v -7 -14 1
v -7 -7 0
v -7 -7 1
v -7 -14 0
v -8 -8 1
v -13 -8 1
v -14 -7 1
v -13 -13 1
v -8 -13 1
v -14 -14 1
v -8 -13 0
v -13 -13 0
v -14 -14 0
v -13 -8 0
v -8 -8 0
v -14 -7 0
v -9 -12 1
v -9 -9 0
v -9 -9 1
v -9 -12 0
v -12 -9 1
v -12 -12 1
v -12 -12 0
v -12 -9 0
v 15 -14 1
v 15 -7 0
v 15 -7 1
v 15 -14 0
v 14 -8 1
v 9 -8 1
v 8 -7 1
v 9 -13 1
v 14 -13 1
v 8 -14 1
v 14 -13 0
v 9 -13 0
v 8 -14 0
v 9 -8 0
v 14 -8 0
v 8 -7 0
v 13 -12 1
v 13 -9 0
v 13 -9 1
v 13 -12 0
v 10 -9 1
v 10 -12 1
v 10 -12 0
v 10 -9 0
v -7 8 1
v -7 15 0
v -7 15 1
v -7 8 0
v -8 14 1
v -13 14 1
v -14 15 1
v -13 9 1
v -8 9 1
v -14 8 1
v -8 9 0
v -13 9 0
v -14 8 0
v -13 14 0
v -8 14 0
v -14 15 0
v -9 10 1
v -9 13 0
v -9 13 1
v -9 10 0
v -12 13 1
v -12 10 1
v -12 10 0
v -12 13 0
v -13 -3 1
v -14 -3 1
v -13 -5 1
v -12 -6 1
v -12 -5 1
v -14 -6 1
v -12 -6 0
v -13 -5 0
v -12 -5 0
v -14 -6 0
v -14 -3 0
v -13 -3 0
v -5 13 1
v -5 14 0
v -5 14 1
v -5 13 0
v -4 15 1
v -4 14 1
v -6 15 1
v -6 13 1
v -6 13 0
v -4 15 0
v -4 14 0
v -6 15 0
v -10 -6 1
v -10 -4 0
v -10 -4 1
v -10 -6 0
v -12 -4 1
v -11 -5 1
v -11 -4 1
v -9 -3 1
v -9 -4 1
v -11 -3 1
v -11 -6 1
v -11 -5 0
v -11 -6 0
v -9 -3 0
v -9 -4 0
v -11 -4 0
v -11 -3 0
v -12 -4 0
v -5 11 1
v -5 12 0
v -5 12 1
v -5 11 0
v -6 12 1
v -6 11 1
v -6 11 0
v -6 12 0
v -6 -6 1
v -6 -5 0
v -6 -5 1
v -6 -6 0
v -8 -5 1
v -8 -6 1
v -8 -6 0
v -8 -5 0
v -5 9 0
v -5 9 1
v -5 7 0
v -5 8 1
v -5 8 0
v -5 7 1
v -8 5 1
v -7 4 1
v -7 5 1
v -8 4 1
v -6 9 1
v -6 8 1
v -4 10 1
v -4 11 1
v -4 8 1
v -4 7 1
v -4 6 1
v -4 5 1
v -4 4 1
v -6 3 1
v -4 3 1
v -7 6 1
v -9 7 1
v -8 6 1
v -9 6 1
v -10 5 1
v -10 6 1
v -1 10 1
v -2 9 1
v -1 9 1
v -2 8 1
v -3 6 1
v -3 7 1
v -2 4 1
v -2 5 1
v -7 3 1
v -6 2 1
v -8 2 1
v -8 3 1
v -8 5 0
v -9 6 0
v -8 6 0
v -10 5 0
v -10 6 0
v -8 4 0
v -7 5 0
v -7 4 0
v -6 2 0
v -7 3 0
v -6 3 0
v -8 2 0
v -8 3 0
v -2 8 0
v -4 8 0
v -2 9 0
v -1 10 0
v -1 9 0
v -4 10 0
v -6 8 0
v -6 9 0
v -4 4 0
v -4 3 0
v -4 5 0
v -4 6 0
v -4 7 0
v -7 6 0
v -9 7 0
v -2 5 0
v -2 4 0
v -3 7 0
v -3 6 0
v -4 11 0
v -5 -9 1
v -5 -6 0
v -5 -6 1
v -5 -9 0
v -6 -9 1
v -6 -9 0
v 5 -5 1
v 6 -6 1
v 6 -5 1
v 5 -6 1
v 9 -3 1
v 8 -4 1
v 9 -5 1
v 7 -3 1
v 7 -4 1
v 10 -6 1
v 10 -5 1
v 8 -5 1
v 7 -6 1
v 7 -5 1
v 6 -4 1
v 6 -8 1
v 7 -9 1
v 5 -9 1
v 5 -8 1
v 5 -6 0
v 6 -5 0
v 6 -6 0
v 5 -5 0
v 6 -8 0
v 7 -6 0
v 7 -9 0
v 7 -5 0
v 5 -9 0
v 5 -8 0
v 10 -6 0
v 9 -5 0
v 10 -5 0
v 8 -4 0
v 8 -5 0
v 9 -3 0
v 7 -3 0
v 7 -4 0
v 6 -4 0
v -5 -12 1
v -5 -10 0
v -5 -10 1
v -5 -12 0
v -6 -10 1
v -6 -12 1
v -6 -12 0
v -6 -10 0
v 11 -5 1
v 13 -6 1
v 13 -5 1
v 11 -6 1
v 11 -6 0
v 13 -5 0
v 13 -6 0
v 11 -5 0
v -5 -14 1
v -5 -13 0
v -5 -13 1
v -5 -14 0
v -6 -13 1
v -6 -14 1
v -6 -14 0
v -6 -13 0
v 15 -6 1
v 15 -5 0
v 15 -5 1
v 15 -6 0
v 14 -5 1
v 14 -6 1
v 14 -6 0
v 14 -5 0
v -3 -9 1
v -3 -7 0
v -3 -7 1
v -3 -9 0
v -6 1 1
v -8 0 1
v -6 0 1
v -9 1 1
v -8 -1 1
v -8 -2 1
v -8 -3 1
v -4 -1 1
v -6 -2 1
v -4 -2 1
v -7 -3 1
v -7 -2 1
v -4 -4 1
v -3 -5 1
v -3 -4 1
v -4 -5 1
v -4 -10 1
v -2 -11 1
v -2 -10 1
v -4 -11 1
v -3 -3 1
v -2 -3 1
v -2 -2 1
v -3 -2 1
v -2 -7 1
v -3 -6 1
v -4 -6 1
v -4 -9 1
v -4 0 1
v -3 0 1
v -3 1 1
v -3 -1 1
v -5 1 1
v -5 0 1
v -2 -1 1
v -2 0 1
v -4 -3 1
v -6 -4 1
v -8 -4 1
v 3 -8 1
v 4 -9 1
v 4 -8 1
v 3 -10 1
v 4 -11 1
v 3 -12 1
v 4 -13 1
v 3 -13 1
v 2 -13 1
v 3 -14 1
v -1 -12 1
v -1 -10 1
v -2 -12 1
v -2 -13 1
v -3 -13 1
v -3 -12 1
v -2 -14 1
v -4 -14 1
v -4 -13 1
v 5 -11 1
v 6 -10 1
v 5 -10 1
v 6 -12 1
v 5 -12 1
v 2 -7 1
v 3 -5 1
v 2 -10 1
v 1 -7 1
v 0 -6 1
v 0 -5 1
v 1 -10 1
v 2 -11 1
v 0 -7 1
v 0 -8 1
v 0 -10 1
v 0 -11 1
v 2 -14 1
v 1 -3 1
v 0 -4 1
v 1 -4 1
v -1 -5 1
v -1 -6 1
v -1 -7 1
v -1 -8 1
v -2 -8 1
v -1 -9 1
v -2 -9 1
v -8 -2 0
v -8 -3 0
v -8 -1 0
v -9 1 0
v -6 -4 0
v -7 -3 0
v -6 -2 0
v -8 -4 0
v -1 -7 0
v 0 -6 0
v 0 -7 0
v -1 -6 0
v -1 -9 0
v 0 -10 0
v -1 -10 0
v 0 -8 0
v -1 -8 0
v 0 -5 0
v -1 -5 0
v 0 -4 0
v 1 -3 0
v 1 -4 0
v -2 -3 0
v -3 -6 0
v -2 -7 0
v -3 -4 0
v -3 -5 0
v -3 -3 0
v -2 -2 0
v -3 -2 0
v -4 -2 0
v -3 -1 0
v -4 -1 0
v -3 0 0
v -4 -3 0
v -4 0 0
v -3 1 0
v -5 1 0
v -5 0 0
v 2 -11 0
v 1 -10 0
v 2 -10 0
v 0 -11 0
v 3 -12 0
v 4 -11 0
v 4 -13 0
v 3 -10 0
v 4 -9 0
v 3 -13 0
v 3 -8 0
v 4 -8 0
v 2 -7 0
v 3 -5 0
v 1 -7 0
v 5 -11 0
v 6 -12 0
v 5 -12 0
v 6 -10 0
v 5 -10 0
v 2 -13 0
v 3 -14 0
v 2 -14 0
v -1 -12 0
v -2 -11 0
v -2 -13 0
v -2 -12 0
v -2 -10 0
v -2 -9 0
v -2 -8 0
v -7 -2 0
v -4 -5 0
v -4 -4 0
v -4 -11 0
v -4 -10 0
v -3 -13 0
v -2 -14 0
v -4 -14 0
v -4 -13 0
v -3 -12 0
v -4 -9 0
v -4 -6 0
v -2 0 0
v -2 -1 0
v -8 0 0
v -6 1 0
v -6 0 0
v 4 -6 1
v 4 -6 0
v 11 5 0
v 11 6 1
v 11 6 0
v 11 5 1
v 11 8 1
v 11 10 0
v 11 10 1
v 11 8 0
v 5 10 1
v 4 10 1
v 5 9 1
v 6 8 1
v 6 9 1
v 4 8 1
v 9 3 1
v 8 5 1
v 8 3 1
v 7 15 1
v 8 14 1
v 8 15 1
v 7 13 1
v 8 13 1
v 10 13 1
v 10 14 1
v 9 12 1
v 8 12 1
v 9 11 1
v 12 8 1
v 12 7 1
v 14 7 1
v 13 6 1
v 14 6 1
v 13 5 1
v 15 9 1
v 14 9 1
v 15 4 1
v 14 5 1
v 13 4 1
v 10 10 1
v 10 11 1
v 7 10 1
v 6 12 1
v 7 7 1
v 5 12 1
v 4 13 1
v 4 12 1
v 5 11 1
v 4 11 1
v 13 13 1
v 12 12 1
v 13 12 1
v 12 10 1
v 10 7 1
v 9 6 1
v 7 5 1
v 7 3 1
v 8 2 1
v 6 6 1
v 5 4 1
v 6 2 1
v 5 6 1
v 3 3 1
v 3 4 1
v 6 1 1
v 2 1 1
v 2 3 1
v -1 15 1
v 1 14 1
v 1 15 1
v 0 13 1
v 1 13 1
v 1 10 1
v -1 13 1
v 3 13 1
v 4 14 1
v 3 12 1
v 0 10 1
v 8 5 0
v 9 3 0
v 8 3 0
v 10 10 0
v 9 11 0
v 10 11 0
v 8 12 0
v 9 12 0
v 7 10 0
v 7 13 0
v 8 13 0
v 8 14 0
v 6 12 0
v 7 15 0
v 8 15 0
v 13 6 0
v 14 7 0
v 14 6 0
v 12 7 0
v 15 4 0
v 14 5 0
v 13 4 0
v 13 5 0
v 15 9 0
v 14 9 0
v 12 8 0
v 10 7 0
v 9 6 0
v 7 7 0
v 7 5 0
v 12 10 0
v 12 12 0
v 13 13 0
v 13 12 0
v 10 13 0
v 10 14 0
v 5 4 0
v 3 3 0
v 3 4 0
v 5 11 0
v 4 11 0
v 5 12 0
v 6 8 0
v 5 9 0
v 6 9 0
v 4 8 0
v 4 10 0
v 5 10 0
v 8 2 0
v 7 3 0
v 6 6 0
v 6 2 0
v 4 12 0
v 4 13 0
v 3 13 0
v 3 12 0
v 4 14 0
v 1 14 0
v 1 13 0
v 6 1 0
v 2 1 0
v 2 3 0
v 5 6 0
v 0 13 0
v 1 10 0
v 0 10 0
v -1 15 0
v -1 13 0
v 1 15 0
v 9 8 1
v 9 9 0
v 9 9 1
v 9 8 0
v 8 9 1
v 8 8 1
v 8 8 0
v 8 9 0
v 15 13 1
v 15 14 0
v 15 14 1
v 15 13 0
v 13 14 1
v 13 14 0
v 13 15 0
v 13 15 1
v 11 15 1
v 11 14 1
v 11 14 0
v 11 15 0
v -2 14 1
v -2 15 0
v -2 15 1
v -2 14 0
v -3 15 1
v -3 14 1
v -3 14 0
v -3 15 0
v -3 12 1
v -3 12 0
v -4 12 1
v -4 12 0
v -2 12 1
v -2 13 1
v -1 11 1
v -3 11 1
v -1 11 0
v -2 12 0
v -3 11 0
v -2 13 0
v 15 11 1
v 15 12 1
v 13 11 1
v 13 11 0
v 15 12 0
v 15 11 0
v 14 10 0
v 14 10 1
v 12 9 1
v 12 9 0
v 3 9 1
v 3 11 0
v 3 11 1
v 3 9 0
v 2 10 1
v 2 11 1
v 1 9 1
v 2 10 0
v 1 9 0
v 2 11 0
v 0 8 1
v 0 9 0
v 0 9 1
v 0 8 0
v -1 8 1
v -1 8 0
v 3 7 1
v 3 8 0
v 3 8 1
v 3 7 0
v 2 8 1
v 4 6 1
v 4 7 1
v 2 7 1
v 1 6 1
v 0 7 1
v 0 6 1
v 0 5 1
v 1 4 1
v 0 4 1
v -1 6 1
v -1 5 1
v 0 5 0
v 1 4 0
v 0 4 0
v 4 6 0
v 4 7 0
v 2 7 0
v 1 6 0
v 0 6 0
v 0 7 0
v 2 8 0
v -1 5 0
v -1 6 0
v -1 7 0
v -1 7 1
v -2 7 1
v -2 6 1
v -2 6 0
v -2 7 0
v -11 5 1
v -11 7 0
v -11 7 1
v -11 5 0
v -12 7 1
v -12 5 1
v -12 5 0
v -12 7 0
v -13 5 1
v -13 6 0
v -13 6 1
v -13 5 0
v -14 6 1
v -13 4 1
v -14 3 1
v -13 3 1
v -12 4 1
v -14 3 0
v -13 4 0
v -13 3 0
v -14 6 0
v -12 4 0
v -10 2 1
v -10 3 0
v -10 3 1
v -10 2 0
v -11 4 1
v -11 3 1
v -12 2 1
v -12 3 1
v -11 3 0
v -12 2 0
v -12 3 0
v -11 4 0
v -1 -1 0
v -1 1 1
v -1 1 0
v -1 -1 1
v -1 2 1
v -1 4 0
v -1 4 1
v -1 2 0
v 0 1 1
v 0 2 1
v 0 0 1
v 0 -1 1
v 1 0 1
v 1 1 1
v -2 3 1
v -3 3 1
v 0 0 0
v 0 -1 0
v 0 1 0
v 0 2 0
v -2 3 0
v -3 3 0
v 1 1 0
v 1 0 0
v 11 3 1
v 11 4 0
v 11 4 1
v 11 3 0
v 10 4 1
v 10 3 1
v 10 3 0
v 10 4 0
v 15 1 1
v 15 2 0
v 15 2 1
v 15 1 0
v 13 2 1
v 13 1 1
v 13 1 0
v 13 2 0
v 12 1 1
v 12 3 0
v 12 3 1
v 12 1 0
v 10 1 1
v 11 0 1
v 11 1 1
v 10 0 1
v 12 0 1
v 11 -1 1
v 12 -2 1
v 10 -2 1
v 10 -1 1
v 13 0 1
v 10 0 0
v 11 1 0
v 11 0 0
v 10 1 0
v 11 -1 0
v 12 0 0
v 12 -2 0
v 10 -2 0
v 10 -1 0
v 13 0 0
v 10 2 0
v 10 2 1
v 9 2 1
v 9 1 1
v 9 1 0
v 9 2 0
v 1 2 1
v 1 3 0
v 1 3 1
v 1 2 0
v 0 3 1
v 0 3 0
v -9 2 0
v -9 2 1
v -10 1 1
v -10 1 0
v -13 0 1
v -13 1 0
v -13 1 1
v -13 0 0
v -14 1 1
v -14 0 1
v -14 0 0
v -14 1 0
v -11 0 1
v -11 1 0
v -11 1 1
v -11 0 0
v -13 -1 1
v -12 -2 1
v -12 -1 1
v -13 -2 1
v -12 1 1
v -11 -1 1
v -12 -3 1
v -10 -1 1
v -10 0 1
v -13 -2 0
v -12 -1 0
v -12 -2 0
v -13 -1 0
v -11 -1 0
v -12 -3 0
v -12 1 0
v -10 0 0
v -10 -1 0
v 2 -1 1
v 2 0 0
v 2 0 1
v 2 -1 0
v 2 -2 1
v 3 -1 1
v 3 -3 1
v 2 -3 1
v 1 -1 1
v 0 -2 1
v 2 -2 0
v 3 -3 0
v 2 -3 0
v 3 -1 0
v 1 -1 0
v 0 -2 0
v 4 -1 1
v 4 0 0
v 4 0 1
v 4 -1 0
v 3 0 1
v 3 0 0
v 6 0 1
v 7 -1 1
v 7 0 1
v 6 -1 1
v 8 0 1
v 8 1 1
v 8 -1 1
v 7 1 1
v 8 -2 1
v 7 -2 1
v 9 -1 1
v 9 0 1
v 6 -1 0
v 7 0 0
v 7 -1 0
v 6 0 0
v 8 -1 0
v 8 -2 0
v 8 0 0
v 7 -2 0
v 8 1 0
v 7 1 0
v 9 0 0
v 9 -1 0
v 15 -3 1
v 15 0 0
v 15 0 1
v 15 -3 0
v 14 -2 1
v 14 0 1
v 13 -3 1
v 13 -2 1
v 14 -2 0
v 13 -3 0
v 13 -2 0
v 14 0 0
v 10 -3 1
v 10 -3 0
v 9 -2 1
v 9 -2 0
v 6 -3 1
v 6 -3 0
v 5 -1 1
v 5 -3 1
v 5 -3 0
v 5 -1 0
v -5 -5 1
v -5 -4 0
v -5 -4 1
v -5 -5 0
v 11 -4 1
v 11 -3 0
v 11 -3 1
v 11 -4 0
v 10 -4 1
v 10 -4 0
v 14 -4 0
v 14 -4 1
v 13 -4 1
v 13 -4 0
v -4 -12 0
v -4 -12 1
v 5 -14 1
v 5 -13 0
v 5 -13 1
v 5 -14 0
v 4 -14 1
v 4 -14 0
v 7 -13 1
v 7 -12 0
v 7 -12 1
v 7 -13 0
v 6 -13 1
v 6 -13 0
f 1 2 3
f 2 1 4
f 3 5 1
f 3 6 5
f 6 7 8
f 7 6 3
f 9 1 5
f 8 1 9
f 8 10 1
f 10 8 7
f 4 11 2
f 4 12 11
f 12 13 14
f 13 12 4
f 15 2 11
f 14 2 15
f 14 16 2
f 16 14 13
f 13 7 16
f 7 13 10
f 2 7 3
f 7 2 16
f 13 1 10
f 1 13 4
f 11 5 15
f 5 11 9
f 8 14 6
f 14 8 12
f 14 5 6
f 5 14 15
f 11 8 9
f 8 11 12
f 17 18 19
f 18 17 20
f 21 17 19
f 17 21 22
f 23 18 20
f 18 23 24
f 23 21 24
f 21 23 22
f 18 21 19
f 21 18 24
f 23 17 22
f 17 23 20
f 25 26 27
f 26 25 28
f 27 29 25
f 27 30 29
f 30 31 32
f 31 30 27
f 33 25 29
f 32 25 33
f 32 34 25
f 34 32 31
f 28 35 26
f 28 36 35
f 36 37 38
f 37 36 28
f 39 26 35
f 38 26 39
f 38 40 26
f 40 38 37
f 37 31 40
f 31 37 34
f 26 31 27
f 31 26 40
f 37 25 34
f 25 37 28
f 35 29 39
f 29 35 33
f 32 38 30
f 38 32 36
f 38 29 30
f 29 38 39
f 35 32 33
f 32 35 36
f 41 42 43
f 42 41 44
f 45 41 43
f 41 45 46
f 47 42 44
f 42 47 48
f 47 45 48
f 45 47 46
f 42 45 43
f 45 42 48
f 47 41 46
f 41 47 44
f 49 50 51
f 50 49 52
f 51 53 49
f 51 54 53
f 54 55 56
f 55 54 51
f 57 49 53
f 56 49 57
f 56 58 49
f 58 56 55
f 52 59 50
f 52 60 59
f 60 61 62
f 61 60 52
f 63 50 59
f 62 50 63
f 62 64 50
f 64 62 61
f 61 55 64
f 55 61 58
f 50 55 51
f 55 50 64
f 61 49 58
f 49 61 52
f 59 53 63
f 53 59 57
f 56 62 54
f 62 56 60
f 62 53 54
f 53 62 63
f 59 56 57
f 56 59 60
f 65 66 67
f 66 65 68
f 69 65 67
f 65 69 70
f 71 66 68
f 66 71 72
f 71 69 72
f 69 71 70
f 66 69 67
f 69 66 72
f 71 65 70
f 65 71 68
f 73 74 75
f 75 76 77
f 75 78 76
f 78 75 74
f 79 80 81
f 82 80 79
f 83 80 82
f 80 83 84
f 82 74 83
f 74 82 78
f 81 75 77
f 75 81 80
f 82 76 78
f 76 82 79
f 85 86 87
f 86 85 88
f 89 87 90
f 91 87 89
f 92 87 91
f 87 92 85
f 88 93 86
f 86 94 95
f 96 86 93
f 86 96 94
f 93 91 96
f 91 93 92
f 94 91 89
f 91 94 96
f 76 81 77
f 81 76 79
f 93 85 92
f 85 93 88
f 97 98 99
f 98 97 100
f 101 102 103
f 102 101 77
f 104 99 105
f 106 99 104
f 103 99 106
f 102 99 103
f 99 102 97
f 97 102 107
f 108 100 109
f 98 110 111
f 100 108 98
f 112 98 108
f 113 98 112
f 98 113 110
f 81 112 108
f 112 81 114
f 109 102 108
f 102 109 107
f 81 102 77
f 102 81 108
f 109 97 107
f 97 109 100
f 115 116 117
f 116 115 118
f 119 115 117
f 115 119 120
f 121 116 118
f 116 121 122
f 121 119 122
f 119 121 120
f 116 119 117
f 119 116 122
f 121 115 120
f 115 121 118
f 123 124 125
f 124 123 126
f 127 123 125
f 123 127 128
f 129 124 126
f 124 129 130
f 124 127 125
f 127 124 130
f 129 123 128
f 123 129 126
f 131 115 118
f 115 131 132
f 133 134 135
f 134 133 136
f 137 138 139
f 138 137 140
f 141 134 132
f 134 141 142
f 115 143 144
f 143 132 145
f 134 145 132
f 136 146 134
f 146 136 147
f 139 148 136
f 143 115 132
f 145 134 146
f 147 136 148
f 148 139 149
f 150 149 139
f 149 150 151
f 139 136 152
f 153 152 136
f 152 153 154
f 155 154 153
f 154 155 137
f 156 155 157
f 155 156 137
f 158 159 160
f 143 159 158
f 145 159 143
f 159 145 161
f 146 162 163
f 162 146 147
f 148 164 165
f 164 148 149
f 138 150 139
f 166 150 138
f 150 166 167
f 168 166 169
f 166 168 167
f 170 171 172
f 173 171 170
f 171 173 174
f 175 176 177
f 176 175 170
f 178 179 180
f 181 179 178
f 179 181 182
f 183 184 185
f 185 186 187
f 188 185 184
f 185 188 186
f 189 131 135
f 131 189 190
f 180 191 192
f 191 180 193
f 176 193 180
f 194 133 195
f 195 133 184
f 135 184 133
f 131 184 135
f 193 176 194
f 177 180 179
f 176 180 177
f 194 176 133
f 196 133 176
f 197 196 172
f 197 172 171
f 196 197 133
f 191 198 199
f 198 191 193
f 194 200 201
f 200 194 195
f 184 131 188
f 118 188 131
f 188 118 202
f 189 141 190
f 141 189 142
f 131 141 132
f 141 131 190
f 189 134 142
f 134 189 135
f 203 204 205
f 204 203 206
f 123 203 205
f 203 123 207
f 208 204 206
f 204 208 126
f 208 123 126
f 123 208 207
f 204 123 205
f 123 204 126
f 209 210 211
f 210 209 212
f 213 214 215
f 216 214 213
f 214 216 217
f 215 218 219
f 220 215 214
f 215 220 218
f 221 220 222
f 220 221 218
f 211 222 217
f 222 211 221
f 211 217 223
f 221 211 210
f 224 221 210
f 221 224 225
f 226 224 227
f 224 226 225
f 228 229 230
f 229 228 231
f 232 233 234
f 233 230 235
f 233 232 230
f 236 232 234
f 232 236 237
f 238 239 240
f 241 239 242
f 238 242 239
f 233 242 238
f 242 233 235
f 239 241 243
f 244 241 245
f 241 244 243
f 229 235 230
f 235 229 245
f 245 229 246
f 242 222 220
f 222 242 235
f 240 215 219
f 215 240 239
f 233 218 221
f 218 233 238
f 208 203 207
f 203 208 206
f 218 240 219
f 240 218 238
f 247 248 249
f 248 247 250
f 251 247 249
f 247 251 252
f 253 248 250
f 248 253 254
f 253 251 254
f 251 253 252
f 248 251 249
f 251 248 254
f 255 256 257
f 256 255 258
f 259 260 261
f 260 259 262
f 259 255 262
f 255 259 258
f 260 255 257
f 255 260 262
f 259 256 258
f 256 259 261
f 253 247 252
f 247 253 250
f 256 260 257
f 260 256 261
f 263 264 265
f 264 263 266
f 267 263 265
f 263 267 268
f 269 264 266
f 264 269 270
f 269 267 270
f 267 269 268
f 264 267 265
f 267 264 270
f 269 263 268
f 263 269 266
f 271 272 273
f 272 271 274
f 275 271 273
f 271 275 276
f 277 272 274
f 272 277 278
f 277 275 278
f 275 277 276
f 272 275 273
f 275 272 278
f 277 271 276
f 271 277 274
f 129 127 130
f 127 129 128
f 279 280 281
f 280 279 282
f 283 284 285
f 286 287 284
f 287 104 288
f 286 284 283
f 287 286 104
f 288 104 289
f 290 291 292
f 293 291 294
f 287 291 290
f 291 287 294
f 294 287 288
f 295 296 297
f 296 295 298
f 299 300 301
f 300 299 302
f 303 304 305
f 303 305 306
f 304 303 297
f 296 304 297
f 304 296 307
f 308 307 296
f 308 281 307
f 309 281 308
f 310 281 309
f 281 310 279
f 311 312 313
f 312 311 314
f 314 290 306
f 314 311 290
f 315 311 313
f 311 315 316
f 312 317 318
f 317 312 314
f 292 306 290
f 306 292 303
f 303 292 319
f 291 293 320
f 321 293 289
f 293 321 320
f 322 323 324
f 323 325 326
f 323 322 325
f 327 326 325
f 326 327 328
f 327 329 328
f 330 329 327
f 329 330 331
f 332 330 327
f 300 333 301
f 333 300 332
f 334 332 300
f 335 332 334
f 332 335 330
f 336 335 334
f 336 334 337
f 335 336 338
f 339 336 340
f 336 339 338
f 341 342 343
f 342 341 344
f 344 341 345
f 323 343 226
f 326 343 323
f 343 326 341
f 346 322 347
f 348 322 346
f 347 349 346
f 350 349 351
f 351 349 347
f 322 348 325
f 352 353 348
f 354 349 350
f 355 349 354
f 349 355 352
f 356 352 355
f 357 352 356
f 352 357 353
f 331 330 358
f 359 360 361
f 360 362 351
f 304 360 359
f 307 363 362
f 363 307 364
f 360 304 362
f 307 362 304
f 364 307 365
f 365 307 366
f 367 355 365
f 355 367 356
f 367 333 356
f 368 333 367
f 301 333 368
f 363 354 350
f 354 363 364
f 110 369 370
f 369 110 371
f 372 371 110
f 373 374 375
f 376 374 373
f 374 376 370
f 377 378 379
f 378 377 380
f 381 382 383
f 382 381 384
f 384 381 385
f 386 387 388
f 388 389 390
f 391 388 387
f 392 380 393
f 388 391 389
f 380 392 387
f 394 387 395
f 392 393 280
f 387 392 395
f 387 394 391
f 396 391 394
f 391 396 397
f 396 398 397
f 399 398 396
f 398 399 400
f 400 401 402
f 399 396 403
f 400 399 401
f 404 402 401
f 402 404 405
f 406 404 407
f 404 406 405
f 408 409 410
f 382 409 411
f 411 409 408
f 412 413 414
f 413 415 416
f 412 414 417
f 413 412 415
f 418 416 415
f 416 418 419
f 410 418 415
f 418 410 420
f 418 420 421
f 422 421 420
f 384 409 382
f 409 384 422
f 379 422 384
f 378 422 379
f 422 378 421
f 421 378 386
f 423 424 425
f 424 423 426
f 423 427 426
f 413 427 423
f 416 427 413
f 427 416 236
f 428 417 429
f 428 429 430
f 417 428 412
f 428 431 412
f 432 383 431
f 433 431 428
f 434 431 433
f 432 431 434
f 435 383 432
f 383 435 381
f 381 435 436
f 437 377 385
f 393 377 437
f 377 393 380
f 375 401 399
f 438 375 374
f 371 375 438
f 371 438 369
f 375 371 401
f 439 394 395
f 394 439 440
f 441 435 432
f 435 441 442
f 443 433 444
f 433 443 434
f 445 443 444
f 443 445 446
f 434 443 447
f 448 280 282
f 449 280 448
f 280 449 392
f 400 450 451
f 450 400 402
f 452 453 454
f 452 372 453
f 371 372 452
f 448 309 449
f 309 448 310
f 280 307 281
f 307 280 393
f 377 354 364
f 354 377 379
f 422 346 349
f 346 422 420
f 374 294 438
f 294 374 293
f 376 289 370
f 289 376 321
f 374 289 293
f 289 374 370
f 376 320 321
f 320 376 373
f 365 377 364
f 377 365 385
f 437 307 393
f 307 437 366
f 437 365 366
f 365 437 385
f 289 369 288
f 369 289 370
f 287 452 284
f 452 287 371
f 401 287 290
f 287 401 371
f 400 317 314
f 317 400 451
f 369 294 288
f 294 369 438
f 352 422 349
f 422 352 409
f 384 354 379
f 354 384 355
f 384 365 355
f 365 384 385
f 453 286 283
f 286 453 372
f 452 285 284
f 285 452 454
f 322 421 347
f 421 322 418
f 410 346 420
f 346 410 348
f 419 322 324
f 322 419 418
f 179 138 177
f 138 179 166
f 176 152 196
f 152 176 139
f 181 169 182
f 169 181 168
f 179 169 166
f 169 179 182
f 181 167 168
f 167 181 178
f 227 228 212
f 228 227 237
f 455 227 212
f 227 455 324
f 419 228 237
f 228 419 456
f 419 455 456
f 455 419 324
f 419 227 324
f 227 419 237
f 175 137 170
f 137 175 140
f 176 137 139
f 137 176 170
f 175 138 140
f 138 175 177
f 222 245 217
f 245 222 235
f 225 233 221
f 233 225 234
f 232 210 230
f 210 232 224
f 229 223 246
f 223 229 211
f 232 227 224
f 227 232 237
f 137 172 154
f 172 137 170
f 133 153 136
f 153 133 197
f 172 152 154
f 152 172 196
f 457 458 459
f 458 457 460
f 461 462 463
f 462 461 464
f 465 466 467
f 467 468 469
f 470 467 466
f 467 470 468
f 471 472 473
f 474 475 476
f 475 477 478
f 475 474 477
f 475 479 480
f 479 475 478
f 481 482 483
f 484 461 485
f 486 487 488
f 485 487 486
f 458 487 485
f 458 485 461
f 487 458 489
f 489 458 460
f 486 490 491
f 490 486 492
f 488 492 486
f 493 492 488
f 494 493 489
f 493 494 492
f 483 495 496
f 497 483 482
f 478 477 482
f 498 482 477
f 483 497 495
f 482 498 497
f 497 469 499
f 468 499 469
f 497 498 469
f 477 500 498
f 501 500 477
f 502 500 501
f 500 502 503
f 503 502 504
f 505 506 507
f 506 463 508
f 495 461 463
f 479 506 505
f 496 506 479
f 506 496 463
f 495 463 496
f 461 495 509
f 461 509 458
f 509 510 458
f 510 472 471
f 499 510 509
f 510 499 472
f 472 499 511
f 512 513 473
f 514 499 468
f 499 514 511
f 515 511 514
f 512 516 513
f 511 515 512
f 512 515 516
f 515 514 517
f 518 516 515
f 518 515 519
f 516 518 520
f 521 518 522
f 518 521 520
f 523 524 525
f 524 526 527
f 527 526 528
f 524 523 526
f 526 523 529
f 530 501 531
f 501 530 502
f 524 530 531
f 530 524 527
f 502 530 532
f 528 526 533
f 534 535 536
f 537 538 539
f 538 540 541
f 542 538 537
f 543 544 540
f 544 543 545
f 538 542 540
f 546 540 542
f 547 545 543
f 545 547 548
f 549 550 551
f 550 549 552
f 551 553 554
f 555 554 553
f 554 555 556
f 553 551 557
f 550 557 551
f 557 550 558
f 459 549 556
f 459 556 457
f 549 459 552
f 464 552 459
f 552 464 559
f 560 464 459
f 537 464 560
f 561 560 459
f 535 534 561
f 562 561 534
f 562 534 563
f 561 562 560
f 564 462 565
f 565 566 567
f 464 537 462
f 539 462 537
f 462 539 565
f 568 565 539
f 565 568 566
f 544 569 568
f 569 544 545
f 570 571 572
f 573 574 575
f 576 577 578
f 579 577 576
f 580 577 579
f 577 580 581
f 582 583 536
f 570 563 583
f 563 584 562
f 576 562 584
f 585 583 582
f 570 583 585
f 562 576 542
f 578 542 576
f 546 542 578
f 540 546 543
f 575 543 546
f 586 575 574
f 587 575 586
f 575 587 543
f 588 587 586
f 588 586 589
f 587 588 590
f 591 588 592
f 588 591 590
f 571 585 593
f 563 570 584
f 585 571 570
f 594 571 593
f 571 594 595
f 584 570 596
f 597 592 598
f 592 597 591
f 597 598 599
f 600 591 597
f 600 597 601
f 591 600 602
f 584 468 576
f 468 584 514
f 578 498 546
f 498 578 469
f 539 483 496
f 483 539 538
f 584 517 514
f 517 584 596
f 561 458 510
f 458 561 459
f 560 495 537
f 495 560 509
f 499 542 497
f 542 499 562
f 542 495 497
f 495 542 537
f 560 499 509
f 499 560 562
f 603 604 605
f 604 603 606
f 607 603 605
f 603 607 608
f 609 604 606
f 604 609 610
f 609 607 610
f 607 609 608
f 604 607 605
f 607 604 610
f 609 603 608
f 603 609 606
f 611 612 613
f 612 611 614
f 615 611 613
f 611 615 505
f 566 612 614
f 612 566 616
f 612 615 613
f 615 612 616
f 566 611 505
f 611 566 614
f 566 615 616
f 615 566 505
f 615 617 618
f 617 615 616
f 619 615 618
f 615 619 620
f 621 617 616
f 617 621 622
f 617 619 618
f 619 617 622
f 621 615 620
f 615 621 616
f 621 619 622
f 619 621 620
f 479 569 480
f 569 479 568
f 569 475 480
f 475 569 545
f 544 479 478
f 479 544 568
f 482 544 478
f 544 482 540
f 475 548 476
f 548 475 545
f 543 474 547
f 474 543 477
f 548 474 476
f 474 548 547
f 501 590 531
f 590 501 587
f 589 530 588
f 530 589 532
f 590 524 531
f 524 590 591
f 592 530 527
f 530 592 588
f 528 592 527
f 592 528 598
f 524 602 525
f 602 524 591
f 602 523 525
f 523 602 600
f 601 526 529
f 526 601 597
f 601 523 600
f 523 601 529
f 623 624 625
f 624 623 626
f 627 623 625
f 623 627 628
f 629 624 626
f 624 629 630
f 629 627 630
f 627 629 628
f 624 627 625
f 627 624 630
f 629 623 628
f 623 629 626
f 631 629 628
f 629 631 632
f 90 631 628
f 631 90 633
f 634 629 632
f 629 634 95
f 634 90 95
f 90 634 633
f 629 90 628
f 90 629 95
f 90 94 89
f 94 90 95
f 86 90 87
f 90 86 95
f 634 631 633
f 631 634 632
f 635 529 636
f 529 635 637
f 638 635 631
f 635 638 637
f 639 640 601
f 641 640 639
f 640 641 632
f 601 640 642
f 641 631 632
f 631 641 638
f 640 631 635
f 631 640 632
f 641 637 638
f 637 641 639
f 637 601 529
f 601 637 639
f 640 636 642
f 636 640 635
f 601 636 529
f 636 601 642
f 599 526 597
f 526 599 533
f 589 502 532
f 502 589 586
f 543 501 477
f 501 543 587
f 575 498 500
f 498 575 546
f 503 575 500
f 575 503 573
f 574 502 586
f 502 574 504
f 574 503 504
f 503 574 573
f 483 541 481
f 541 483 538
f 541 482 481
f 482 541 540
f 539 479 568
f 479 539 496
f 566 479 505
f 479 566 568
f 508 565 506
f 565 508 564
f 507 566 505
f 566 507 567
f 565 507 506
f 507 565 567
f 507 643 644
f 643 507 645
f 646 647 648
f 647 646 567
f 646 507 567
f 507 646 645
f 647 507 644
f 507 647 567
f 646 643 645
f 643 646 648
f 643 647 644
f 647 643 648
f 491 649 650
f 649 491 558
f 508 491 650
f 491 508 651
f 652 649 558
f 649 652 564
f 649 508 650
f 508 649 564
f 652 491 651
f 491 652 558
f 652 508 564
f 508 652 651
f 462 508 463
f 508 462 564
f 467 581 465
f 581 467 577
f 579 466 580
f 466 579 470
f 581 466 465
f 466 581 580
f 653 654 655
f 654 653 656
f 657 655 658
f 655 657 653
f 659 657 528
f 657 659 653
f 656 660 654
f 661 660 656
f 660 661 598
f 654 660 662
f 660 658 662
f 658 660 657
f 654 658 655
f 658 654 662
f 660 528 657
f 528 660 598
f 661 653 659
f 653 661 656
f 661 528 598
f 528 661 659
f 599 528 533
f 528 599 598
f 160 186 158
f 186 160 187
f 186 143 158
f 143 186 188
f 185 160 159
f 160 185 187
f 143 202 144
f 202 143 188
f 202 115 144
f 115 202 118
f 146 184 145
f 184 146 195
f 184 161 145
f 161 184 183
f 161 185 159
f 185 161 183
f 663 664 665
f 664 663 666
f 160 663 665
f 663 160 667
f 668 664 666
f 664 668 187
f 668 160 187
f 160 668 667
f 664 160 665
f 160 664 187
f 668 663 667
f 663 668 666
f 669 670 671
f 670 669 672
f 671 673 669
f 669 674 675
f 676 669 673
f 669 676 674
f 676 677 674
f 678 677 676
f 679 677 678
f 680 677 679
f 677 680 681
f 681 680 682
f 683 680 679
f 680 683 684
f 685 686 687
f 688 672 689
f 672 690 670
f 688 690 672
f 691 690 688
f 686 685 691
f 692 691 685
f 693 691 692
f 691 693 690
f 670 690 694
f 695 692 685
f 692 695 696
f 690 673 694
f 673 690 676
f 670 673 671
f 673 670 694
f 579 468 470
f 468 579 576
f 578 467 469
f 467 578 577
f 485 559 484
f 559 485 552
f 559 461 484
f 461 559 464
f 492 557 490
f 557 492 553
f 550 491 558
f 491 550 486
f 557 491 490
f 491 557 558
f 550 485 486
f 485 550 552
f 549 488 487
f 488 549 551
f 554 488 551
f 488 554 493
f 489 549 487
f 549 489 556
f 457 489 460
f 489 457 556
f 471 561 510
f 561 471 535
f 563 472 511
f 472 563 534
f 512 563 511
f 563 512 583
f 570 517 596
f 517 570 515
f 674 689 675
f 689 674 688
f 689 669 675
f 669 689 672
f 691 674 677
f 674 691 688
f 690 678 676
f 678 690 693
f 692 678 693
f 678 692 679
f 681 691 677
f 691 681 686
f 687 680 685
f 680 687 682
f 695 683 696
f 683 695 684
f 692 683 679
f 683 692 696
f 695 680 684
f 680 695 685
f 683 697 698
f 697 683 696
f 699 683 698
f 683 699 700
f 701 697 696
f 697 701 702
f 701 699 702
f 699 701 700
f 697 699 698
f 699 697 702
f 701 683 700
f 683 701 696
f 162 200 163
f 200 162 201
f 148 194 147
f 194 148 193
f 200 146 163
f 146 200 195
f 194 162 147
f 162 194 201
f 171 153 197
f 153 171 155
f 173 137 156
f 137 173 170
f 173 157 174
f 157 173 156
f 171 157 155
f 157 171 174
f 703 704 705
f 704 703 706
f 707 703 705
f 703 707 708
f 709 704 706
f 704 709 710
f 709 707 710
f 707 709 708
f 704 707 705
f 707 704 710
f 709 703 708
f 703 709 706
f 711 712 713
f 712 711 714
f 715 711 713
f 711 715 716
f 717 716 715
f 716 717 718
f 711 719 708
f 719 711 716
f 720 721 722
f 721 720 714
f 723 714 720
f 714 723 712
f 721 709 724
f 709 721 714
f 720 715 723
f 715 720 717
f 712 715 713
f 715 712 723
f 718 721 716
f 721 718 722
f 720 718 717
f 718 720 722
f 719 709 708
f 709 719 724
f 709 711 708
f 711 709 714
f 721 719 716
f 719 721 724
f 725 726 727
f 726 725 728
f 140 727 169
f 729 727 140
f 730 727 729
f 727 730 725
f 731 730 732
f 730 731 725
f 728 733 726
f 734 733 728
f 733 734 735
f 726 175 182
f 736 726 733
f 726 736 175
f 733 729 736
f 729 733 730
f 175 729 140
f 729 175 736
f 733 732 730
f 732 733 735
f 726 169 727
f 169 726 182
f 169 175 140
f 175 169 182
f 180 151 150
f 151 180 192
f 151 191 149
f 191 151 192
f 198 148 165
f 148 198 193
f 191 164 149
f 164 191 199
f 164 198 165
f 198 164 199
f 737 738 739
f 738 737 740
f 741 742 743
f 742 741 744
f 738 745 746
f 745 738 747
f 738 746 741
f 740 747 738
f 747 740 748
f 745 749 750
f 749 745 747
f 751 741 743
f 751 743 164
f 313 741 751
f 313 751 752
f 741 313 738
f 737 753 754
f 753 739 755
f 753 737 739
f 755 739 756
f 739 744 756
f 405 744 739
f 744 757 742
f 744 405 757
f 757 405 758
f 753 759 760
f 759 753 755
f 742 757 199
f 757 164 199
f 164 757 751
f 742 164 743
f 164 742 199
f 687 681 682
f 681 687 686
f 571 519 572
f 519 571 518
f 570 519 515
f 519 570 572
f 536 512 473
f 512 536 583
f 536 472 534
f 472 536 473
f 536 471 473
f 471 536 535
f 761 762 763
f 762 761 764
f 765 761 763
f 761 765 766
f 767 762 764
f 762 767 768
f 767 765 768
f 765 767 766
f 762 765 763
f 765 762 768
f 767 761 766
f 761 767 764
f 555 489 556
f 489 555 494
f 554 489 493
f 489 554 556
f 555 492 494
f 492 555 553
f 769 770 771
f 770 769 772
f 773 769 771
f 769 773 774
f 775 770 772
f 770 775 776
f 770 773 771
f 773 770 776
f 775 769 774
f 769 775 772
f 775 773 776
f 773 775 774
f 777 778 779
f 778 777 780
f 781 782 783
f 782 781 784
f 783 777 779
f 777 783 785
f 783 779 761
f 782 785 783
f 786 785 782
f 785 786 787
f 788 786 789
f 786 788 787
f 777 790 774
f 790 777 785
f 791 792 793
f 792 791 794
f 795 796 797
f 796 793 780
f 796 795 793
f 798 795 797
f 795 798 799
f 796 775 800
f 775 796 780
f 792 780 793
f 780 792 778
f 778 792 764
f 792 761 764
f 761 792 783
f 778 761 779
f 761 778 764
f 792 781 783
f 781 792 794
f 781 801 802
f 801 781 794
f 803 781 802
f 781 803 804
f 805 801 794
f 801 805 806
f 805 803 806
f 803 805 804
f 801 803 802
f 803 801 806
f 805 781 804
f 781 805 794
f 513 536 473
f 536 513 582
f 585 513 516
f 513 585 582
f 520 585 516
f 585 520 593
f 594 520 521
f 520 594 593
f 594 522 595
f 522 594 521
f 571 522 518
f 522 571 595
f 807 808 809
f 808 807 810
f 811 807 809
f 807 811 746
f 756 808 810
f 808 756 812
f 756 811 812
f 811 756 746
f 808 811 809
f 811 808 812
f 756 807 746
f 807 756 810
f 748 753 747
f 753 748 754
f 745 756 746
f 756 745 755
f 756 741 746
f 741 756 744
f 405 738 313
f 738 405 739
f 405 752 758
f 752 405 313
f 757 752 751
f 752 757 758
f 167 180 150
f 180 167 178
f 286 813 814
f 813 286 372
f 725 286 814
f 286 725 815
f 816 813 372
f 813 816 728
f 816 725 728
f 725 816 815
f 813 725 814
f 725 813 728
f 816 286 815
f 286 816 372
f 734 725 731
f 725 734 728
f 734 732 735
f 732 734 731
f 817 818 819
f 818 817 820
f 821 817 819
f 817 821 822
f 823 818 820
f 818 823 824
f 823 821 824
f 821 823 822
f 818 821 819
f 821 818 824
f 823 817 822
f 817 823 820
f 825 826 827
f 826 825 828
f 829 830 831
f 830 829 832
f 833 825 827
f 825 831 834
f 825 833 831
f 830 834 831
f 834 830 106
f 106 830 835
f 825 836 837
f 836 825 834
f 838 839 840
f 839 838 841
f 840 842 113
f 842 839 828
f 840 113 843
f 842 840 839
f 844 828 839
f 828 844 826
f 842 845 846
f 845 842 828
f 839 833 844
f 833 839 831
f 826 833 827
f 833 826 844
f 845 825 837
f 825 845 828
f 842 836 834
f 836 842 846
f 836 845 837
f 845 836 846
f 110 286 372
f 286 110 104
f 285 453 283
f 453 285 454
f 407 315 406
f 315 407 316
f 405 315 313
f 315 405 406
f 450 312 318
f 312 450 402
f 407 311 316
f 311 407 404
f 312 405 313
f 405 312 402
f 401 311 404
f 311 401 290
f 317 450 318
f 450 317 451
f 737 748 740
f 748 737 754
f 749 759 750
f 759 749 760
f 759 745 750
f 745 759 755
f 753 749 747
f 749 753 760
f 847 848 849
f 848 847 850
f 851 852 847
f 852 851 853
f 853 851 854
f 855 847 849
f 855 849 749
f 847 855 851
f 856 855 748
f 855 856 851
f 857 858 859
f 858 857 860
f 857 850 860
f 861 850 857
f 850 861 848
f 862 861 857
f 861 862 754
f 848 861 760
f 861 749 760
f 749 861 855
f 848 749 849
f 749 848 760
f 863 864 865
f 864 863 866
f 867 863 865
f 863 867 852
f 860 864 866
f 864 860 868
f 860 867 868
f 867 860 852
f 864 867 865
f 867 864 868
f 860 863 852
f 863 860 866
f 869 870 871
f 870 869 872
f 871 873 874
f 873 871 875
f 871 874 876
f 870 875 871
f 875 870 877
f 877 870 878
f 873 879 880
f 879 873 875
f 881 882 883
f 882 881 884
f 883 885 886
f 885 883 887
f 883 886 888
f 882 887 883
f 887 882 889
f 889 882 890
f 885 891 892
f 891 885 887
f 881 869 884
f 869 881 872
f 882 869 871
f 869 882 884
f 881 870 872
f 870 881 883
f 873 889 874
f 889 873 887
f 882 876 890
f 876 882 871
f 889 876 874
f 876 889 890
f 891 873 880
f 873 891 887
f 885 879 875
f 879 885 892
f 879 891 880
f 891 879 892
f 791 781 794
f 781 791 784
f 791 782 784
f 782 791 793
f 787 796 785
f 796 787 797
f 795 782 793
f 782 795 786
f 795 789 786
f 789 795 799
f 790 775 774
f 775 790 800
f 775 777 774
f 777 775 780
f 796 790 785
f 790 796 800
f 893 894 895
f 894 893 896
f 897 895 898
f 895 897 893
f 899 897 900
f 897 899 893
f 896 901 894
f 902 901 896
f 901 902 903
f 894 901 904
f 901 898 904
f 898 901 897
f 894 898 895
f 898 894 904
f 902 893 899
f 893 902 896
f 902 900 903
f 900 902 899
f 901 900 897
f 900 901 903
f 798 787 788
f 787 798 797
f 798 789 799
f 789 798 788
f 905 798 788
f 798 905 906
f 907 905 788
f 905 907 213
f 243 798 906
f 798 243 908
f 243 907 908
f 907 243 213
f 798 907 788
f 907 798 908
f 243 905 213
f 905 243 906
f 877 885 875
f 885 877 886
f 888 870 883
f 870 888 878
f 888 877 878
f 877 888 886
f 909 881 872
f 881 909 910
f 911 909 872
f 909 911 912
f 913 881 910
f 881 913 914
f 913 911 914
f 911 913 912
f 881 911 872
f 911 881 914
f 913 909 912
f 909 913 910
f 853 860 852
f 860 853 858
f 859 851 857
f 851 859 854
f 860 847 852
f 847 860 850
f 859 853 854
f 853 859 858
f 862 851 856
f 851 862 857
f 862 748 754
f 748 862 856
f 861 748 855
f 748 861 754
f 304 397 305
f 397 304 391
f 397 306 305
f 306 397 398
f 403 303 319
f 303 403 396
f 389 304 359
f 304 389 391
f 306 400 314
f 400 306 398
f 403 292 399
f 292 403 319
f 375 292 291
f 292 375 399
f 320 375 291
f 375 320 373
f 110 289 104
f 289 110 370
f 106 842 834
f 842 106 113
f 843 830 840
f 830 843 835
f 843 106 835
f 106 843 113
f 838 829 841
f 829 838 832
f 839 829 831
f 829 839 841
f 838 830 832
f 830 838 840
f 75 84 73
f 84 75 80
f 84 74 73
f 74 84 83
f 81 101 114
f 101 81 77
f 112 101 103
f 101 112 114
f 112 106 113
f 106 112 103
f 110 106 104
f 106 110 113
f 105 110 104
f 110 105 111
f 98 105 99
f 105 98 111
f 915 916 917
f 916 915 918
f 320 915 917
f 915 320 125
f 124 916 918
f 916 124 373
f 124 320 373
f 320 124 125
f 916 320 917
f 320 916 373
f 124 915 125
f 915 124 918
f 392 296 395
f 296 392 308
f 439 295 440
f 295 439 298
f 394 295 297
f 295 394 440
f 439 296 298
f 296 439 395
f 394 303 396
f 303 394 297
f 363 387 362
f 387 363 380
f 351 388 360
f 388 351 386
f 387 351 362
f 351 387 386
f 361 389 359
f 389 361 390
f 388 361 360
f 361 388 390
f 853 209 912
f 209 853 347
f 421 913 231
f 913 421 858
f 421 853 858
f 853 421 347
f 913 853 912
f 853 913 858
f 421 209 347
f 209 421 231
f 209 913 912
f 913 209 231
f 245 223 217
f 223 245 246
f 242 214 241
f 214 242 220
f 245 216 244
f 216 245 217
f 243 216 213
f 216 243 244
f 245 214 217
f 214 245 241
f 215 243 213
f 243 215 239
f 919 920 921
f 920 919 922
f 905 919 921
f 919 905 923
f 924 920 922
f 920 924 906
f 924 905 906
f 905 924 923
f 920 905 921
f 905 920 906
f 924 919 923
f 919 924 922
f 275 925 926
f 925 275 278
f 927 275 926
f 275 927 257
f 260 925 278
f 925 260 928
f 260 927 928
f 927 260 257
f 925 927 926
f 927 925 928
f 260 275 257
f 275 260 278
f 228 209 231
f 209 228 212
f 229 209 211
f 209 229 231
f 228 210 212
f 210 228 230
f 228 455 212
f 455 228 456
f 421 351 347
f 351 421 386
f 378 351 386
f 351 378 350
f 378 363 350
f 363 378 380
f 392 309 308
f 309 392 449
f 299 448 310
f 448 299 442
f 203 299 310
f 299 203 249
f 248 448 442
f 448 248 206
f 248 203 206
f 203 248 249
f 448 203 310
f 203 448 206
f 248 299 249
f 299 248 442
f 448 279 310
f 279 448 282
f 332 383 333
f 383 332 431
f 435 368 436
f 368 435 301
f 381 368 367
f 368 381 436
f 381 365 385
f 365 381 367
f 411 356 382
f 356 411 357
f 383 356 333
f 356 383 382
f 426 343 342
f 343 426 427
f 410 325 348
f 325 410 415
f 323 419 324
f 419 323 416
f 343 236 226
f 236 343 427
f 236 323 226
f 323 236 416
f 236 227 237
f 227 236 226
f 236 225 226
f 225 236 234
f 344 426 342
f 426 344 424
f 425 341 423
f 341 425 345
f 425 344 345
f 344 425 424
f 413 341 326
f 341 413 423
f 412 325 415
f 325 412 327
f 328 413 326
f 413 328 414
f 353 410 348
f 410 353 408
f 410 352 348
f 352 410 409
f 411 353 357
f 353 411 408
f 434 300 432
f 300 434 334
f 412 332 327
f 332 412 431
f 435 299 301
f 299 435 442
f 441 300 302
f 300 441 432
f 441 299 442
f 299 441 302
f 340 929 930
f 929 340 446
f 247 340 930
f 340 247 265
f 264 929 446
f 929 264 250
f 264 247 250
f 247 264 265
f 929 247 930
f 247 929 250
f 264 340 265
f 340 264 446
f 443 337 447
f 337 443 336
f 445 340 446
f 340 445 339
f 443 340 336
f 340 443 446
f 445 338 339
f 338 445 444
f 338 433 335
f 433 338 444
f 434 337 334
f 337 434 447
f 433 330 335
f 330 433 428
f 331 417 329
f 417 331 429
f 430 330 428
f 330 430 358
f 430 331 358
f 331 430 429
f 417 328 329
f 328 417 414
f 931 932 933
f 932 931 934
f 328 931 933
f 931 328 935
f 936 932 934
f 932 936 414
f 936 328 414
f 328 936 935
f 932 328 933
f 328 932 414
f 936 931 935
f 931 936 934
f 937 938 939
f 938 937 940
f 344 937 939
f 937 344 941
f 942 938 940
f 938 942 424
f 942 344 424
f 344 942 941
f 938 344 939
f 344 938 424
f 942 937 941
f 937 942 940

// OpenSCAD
// preview[view:"north", tilt:"top"]

//The string to encode.
String = "http://www.thingiverse.com/thing:258542";

//The minimum error correction level - higher means it's more stable. Encoding will use the highest available error correction for the smallest size available.
Min_Error_Correction_level = "medium"; //[low,medium,quartile,high]

//Which masking pattern to use. The code should scan with any.
Mask = 3; //[0:7]

/* [Hidden] */

//Whether we set a fixed size for the output (true) or use fixed size pixels (false)
Fixed_size = false; //[true,false]

//The encoding method
Encoding = "byte"; //["num","alphanum","byte"]

coefficients = [1,2,4,8,16,32,64,128,29,58,116,232,205,135,19,38,76,152,45,90,180,117,234,201,143,3,6,12,24,48,96,192,157,39,78,156,37,74,148,53,106,212,181,119,238,193,159,35,70,140,5,10,20,40,80,160,93,186,105,210,185,111,222,161,95,190,97,194,153,47,94,188,101,202,137,15,30,60,120,240,253,231,211,187,107,214,177,127,254,225,223,163,91,182,113,226,217,175,67,134,17,34,68,136,13,26,52,104,208,189,103,206,129,31,62,124,248,237,199,147,59,118,236,197,151,51,102,204,133,23,46,92,184,109,218,169,79,158,33,66,132,21,42,84,168,77,154,41,82,164,85,170,73,146,57,114,228,213,183,115,230,209,191,99,198,145,63,126,252,229,215,179,123,246,241,255,227,219,171,75,150,49,98,196,149,55,110,220,165,87,174,65,130,25,50,100,200,141,7,14,28,56,112,224,221,167,83,166,81,162,89,178,121,242,249,239,195,155,43,86,172,69,138,9,18,36,72,144,61,122,244,245,247,243,251,235,203,139,11,22,44,88,176,125,250,233,207,131,27,54,108,216,173,71,142];
inv_coef = [255,0,1,25,2,50,26,198,3,223,51,238,27,104,199,75,4,100,224,14,52,141,239,129,28,193,105,248,200,8,76,113,5,138,101,47,225,36,15,33,53,147,142,218,240,18,130,69,29,181,194,125,106,39,249,185,201,154,9,120,77,228,114,166,6,191,139,98,102,221,48,253,226,152,37,179,16,145,34,136,54,208,148,206,143,150,219,189,241,210,19,92,131,56,70,64,30,66,182,163,195,72,126,110,107,58,40,84,250,133,186,61,202,94,155,159,10,21,121,43,78,212,229,172,115,243,167,87,7,112,192,247,140,128,99,13,103,74,222,237,49,197,254,24,227,165,153,119,38,184,180,124,17,68,146,217,35,32,137,46,55,63,209,91,149,188,207,205,144,135,151,178,220,252,190,97,242,86,211,171,20,42,93,158,132,60,57,83,71,109,65,162,31,45,67,216,183,123,164,118,196,23,73,236,127,12,111,246,108,161,59,82,41,157,85,170,251,96,134,177,187,204,62,90,203,89,95,176,156,169,160,81,11,245,22,235,122,117,44,215,79,174,213,233,230,231,173,232,116,214,244,234,168,80,88,175];

version_table = [[[17,[[19,7]],1],[14,[[16,10]],1],[11,[[13,13]],1],[7,[[9,17]],1],0],
						[[32,[[34,10]],1],[26,[[28,16]],1],[20,[[22,22]],1],[14,[[16,28]],1],7],
						[[53,[[55,15]],1],[42,[[44,26]],1],[32,[[17,18],[17,18]],1],[24,[[13,22],[13,22]],2],7],
						[[78,[[80,20]],1],[62,[[32,18],[32,18]],2],[46,[[24,26],[24,26]],2],[34,[[9,16],[9,16],[9,16],[9,16]],4],7],
						[[106,[[108,26]],1],[84,[[43,24],[43,24]],2],[60,[[15,18],[15,18],[16,18],[16,18]],4],[44,[[11,22],[11,22],[12,22],[12,22]],4],7],
						[[134,[[68,18],[68,18]],2],[106,[[27,16],[27,16],[27,16],[27,16]],4],[74,[[19,24],[19,24],[19,24],[19,24]],4],[58,[[15,28],[15,28],[15,28],[15,28]],4],7]
];

error_formula = ["","","001901","","","0071A4A6770A","0074008605B00F","0057E59295EE6615","00AFEED0F9D7FCC41C","","00FB432E3D7646405E202D","","","004A98B06456646A6882DACE8C4E","00C7F99B30BE7CDA89D857CF3B165B","0008B73D5BCA25333A3AED8C7C056369","0078686B6D66A14C035BBF93A9C2E178","002B8BCE4E2BEF7BCED69318639627F3A388","00D7EA9E5EB86176AA4FBB9894FCB305626099","","00113C4F323DA31ABBCAB4DDE153EF9CA4D4D4BCBE","","00D2ABF7F25DE60E6DDD35C84A08AC6250DB86A069A5E7","","00E5798730D375FB7E9FB4A998C0E2E4DA6F0075E85760E315","","00AD7D9E0267B6761191C96F1CA535A115F58E0D6630E39991DA46","","00A8DFC868E0EA6CB46EBEC393CD1BE8C9152BF5572AC3D477F225097B","","0029AD9198D81FB3B632306E56EF60DE7D2AADE2C1E0829C25FBD8EE28C0B4","","0A066ABEF9A70443D18A8A20F27B591B78B9509C2645AB3C1CDE5034FEB9DCF1","","006F4D925E1A156C13695E71C1568CA37D3A9EE5EFDA673846723DB781A70D623E8133","","00C8B76210AC1FF6EA3C987300A79871F8EE6B123FDA2557D269B1784A79C475FB71E91E2F083B744FA1FC6280CD80A1F739A338EB6A351ABBAEE268AA07AF23B57258292FA37D864814E835230F","","","","","","00FA67DDE6191289E700033AF2DDBF6E54E608BC6A60930F838B2265DF2765D5C7EDFEC97BABA2C2753260","","00BE073D7947F64537A8BC59F3BF19487B09910EF701EE2C4E8F3EE07E767244A334C2D993CCA92582716649B5","","00705E5870FDE0CA73BB6359053671812C3A1087D8A9D3240104603CF14968EA08F9F577AE34199DE02BCADF13520F","","00E419C482D3923C18FB5A2766F03DB23F2E7B7312DD6F87A0B6CD6BCE5F9678B85B15F79C8CEEBF0B5EE35432A327226C","","00E87D9DA1A409762ED163CBC12303D16FC3F2CBE12E0D20A07ED182A0F2D7F24B4D2ABD2071417C45E472EBAF7CAAD7E885CD","","00743256BA32DCFB59C02E567F7C13B8E997D7160E3B9125F2CB86FE59BE5E3B417C7164E9EB79164C566127F2C8DC6521EFFE7433","","00B71AC957D2DD71152E412D32EEB8F9E1663AD1DA6DA51A5FB8C034F523FEEEAFAC4F7B197A2B786CD75080C9EB08993B651FC64C1F9C","","006A786B9DA4D87074025BF8A324C9CAE50690FE9B87D0AAD10C8B7F8EB6F9B1AEBE1C0A55EFB8657C98CE6017A33D1BC4F7979ACACF143D0A","","0052741AF7421B3E6BFCB6C8B9EB37FBF2D2909AEDB08DC0F898F9CE55FD8E41A57D17181E7AF0D60681DA1D917F86CEF5751D293F9F8EE97D947B","","006B8C1A0C098DF3C5E2C5DB2DD365DB781CB57F0664F702CDC63973DB656DA0522526EE31A0D179560B7C1EB55419C2574166BEDC461BD110590721F0","","0041CA716247DFF876D65E007A251702E43A790769874EF376464CDF594832466FC211D47EB523DD75EB0BE595937BD5287306C8641AF6B6DA7FD724BA6E6A","","002D33AF09079E9F3144775C7BB1CCBBFEC84E8D95771A7F35A05DC7D41D18919CD096DAD104D85B2FB8922F8CC3C37DF2EE3F636C8CE6F21FCC0BB2F3D99CD5E7","","000576DEB48888A2332E750DD751118BF7C5AB5FAD4189B2446F5F652948D6A9C55F072C9A4D6FEC28798F3F5750FDF07ED94D22E86A32A8524C92436AAB19845D2D69","","00F79FDF21E05D4D465AA020FE2B965465BECD85343CCAA5DCCB975D540F54FDADA059E334C7615FE734B1297D89F1A6E17602362052D7AFC62BEEEB1B65B87F030508A3EE"];

color("black")
QR_code(String, Encoding, Min_Error_Correction_level, Fixed_size, Mask);

module QR_code(string, encoding, min_ec, fs, mask) {
	version = version(string, encoding, ec_to_int(min_ec));
	ec=ec(string,ec_to_int(min_ec),version);
	encoded_string = version<10 ? encode(str("4",int_to_hex(len(string)),str_to_hex(string),"0"), ec, version) : encode(str("4",int_to_hex(floor(len(string)/256)),int_to_hex(len(string)%256),str_to_hex(string),"0"), ec, version);

    offset = 8 + (version * 2);
    translate(v=[ -offset, -offset, 0 ])

	union() {
		Position_pattern();
		translate(v=[10+4*version,0,0])
		Position_pattern();
		translate(v=[0,10+4*version,0])
		Position_pattern();
		translate(v=[9+4*version,8,0])
		cube([1,1,1]);
		Format_pattern(format_sequence(ec,mask), version);
		Timing_pattern(version);
		draw_alignment_patterns(version);
		draw_encoded_string(encoded_string, version, mask);
	}
}

module draw_encoded_string(encoded_string, version, mask) {
	for (bit=[0:len(encoded_string)-1]) {
		draw(encoded_string, version, bit, position(bit,version), mask);
	}
}

module draw(string, version, bit, xy, mask) {
	_draw(string, version, bit, floor(xy/1000), xy%1000, mask);
}

module _draw(string, version, bit, x, y, mask) {
	if (xor(string[bit]=="1",mask(x,y,mask))) {
		translate(v=[x,y,0])
		cube([1,1,1]);
	}
}

module draw_alignment_patterns(version) {
	if (version == 1) {
	} else if (version < 7) {
		translate(v=[8+4*version,8+4*version,0])
		Alignment_pattern();
	} else if (version < 14) {
		for (i=[0:2]) {
			for (j=[0:2]) {
				if ((i!=0 && j!=0) || i==1 || j==1) {
					translate(v=[2*i*(version+1)+4,2*j*(version+1)+4,0])
					Alignment_pattern();
				}
			}
		}
	}
}

module Position_pattern() {
	difference() {
		cube([7,7,1]);
		translate(v=[1,1,-1])
		cube([5,5,3]);
	}
	translate(v=[2,2,0])
	cube([3,3,1]);
}

module Alignment_pattern() {
	difference() {
		cube([5,5,1]);
		translate(v=[1,1,-1])
		cube([3,3,3]);
	}
	translate(v=[2,2,0])
	cube([1,1,1]);
}

module Format_pattern(sequence, version) {
	for (i=[0:5]) {
		if (sequence[14-i]=="1") {
			translate(v=[i,8,0])
			cube([1,1,1]);
			translate(v=[8,16+4*version-i,0])
			cube([1,1,1]);
		}
	}
	for (i=[6:7]) {
		if (sequence[14-i]=="1") {
			translate(v=[i+1,8,0])
			cube([1,1,1]);
			translate(v=[8,16+4*version-i,0])
			cube([1,1,1]);
		}
	}
	for (i=[8]) {
		if (sequence[14-i]=="1") {
			translate(v=[8,15-i,0])
			cube([1,1,1]);
			translate(v=[2+4*version+i,8,0])
			cube([1,1,1]);
		}
	}
	for (i=[9:14]) {
		if (sequence[14-i]=="1") {
			translate(v=[8,14-i,0])
			cube([1,1,1]);
			translate(v=[2+4*version+i,8,0])
			cube([1,1,1]);
		}
	}
}

module Timing_pattern(version) {
	for (i=[0:2*version]) {
		translate(v=[2*i+8,6,0])
		cube([1,1,1]);
		translate(v=[6,2*i+8,0])
		cube([1,1,1]);
	}
}

function substring(string,start,end,output="") = start==end ? output : str(string[start],substring(string,start+1,end,output));

function encode(string, ec, version) = str(encode_data(pad_data(string, ec, version), ec, version), encode_error(pad_data(string, ec, version), ec, version), padding_bits(ec, version));

function encode_error(s, ec, v) = encode_error_data(error_data(s, ec, v), ec, v);

function encode_error_data(string, ec, version, pos=0, byte=0, block=0) =
	version_table[version-1][ec][1][block][1]>byte ? str(bits(hex_to_int(string[pos])*16+hex_to_int(string[pos+1])), encode_error_data(string, ec, version, _next_epos(version, ec, pos, byte, block), _next_ebyte(version, ec, pos, byte, block), _next_eblock(version, ec, pos, byte, block))) : "";
function _next_epos(v,ec,p,y,b) = b<len(version_table[v-1][ec][1])-1 ? p+2*version_table[v-1][ec][1][b][1] :
	y<version_table[v-1][ec][1][0][1]-1 ? 2*(y+1) :
	y<version_table[v-1][ec][1][b][1]-1 ? 2*(version_table[v-1][ec][2]*version_table[v-1][ec][1][0][1]+y+1) : 2*(y+1);
function _next_ebyte(v,ec,p,y,b) = b<len(version_table[v-1][ec][1])-1 ? y : y+1;
function _next_eblock(v,ec,p,y,b) = b<len(version_table[v-1][ec][1])-1 ? b+1 :
	y<version_table[v-1][ec][1][0][1]-1 ? 0 :
	y<version_table[v-1][ec][1][b][1]-1 ? version_table[v-1][ec][2] : 0;

function error_data(s, ec, v, b=0) = b<len(version_table[v-1][ec][1]) ? str(error_block(substring(s,0,2*version_table[v-1][ec][1][b][0]), ec, v, b),error_data(substring(s,2*version_table[v-1][ec][1][b][1],len(s)), ec, v, b+1)) : "";
//function error_data(s, ec, v, b=0) = error_block(str_to_hex(substring(substring(s,version_table[v][ec][1][b][1],len(s)),0,version_table[v][ec][1][b][1])), ec, v, b);

function error_block(s, ec, v, b) = encode_eb(pad_eb(s,version_table[v-1][ec][1][b][1]),error_formula[version_table[v-1][ec][1][b][1]]);
//function error_block(s, ec, v, b) = str(version_table[v][ec][1][b][1]);

function pad_eb(s,count) = count<=0 ? s : pad_eb(str(s,"00"),count-1);

function encode_eb(s,f) = len(s)<=len(f)-2 ? s : encode_eb(substring(_encode_eb(s,f,log_a(hex_to_int(s[0])*16+hex_to_int(s[1]))),2,len(s)),f);

function _encode_eb(s,f,s0,p=0) = p==len(f) ? substring(s,p,len(s)) :
	str(int_to_hex(bitwise_xor(pow_a(((hex_to_int(f[p])*16+hex_to_int(f[p+1]))+s0)%255),hex_to_int(s[p])*16+hex_to_int(s[p+1]))),_encode_eb(s,f,s0,p+2));

function pow_a(x) = coefficients[x];
function log_a(x) = inv_coef[x];

function encode_data(string, ec, version, pos=0, byte=0, block=0) =
	version_table[version-1][ec][1][block][0]>byte ? str(bits(hex_to_int(string[pos])*16+hex_to_int(string[pos+1])), encode_data(string, ec, version, _next_dpos(version, ec, pos, byte, block), _next_dbyte(version, ec, pos, byte, block), _next_dblock(version, ec, pos, byte, block))) : "";
function _next_dpos(v,ec,p,y,b) = b<len(version_table[v-1][ec][1])-1 ? p+2*version_table[v-1][ec][1][b][0] :
	y<version_table[v-1][ec][1][0][0]-1 ? 2*(y+1) :
	y<version_table[v-1][ec][1][b][0]-1 ? 2*(version_table[v-1][ec][2]*version_table[v-1][ec][1][0][0]+y+1) : 2*(y+1);
function _next_dbyte(v,ec,p,y,b) = b<len(version_table[v-1][ec][1])-1 ? y : y+1;
function _next_dblock(v,ec,p,y,b) = b<len(version_table[v-1][ec][1])-1 ? b+1 :
	y<version_table[v-1][ec][1][0][0]-1 ? 0 :
	y<version_table[v-1][ec][1][b][0]-1 ? version_table[v-1][ec][2] : 0;

function padding_bits(ec, v, b=0) = b<version_table[v-1][4] ? str("0",padding_bits(ec,v,b+1)) : "";

function pad_data(string, ec, v, pad_string="") = len(string)+len(pad_string)>2*version_table[v-1][ec][0]+2+floor((v+20)/30) ? str(string,pad_string) :
	len(pad_string)%4 == 0 ? pad_data(string, ec, v, str(pad_string,"EC")) :
	pad_data(string, ec, v, str(pad_string,"11"));

function bits(char, bit=0) = bit<7 ? str(_bit(char,bit),bits(char - (_bit(char,bit) * pow(2,7-bit)),bit+1)) : _bit(char,bit);
function _bit(char, bit) = char>=pow(2,7-bit) ? 1 : 0;

function hex_bits(chars) = bits(hex_to_int(chars[0])*16+hex_to_int(chars[1]));
function hex_to_int(char) = search(char,"0123456789ABCDEF")[0];

function int(char, i=0) = (chr(i) == char) ? i : int(char, i+1);
function ec_to_int(ec) = ec=="low" ? 0 :
								ec=="medium" ? 1 :
								ec=="quartile" ? 2 : 3;

function format_sequence(ec,mask) = ["101010000010010","101000100100101","101111001111100","101101101001011","100010111111001","100000011001110","100111110010111","100101010100000","111011111000100","111001011110011","111110110101010","111100010011101","110011000101111","110001100011000","110110001000001","110100101110110","001011010001001","001001110111110","001110011100111","001100111010000","000011101100010","000001001010101","000110100001100","000100000111011","011010101011111","011000001101000","011111100110001","011101000000110","010010010110100","010000110000011","010111011011010","010101111101101"][bitwise_xor(ec,1)*8+mask];

function version(string, encoding, ec, v=1) = len(string)<=version_table[v-1][ec][0] ? v : version(string, encoding, ec, v+1);

function ec(s,ec,v) = ec<4 && len(s)<=version_table[v-1][ec][0] ? ec(s,ec+1,v) : ec-1;

function xor(a, b) = (a||b)&& !(a&&b);

function bitwise_xor(a, b) = (a==0 && b==0) ? 0 : 2*bitwise_xor(floor(a/2), floor(b/2))+(xor(a%2==1,b%2==1)?1:0);

function mask(x, y, m) = m==0 ? mask0(x,y) :
								m==1 ? mask1(x,y) :
								m==2 ? mask2(x,y) :
								m==3 ? mask3(x,y) :
								m==4 ? mask4(x,y) :
								m==5 ? mask5(x,y) :
								m==6 ? mask6(x,y) :
								mask7(x,y);
function mask0(x,y) = (x+y)%2 == 0;
function mask1(x,y) = x%2 == 0;
function mask2(x,y) = y%3 == 0;
function mask3(x,y) = (x+y)%3 == 0;
function mask4(x,y) = (floor(x/2)+floor(y/3))%2 == 0;
function mask5(x,y) = (x*y)%2 + (x*y)%3 == 0;
function mask6(x,y) = ((x*y)%2 + (x*y)%3)%2 == 0;
function mask7(x,y) = ((x+y)%2 + (x*y)%3)%2 == 0;

function position(bit, version) = _position(bit,4*version+16,4*version+16,version,-1);
function reserved(x,y,v) = x==6 || y==6 ||
			(x<9 && y<9) || (x<9 && y>4*v+8) || (x>4*v+8 && y<9) ||
			(v>6 && x>4*v+5 && y<6) || (v>6 && y>4*v+5 && x<6) ||
			(v>1 && x>=4*v+8 && x<=4*v+12 && y>=4*v+8 && y<=4*v+12) ||
			(v>=7 && v<=13 && ((x>=2*v+6 && x<=2*v+10 && y%(2*v+2)>=4 && y%(2*v+2)<=8) || (y>=2*v+6 && y<=2*v+10 && x%(2*v+2)>=4 && x%(2*v+2)<=8)));
function _position(b,x,y,v,d) = b==0 && !reserved(x,y,v) ? 1000*x+y :
	reserved(x,y,v) ? _next_pos(b,x,y,v,d) : _next_pos(b-1,x,y,v,d);
function _next_pos(b,x,y,v,d) = (y == 6) || ((y>6 && y%2 == 0) || (y<6 && y%2 == 1)) ? _position(b,x,y-1,v,d) :
	 (d<0 && x == 0) || (d>0 && x == 4*v+16) ? _position(b,x,y-1,v,-d) :
	_position(b,x+d,y+1,v,d);

function str_to_hex(string,char=0) = char==len(string) ? "" : str("0123456789ABCDEF"[floor(int(string[char])/16)],"0123456789ABCDEF"[int(string[char])%16],str_to_hex(string,char+1));

function int_to_hex(i) = str("0123456789ABCDEF"[floor(i/16)],"0123456789ABCDEF"[i%16]);
